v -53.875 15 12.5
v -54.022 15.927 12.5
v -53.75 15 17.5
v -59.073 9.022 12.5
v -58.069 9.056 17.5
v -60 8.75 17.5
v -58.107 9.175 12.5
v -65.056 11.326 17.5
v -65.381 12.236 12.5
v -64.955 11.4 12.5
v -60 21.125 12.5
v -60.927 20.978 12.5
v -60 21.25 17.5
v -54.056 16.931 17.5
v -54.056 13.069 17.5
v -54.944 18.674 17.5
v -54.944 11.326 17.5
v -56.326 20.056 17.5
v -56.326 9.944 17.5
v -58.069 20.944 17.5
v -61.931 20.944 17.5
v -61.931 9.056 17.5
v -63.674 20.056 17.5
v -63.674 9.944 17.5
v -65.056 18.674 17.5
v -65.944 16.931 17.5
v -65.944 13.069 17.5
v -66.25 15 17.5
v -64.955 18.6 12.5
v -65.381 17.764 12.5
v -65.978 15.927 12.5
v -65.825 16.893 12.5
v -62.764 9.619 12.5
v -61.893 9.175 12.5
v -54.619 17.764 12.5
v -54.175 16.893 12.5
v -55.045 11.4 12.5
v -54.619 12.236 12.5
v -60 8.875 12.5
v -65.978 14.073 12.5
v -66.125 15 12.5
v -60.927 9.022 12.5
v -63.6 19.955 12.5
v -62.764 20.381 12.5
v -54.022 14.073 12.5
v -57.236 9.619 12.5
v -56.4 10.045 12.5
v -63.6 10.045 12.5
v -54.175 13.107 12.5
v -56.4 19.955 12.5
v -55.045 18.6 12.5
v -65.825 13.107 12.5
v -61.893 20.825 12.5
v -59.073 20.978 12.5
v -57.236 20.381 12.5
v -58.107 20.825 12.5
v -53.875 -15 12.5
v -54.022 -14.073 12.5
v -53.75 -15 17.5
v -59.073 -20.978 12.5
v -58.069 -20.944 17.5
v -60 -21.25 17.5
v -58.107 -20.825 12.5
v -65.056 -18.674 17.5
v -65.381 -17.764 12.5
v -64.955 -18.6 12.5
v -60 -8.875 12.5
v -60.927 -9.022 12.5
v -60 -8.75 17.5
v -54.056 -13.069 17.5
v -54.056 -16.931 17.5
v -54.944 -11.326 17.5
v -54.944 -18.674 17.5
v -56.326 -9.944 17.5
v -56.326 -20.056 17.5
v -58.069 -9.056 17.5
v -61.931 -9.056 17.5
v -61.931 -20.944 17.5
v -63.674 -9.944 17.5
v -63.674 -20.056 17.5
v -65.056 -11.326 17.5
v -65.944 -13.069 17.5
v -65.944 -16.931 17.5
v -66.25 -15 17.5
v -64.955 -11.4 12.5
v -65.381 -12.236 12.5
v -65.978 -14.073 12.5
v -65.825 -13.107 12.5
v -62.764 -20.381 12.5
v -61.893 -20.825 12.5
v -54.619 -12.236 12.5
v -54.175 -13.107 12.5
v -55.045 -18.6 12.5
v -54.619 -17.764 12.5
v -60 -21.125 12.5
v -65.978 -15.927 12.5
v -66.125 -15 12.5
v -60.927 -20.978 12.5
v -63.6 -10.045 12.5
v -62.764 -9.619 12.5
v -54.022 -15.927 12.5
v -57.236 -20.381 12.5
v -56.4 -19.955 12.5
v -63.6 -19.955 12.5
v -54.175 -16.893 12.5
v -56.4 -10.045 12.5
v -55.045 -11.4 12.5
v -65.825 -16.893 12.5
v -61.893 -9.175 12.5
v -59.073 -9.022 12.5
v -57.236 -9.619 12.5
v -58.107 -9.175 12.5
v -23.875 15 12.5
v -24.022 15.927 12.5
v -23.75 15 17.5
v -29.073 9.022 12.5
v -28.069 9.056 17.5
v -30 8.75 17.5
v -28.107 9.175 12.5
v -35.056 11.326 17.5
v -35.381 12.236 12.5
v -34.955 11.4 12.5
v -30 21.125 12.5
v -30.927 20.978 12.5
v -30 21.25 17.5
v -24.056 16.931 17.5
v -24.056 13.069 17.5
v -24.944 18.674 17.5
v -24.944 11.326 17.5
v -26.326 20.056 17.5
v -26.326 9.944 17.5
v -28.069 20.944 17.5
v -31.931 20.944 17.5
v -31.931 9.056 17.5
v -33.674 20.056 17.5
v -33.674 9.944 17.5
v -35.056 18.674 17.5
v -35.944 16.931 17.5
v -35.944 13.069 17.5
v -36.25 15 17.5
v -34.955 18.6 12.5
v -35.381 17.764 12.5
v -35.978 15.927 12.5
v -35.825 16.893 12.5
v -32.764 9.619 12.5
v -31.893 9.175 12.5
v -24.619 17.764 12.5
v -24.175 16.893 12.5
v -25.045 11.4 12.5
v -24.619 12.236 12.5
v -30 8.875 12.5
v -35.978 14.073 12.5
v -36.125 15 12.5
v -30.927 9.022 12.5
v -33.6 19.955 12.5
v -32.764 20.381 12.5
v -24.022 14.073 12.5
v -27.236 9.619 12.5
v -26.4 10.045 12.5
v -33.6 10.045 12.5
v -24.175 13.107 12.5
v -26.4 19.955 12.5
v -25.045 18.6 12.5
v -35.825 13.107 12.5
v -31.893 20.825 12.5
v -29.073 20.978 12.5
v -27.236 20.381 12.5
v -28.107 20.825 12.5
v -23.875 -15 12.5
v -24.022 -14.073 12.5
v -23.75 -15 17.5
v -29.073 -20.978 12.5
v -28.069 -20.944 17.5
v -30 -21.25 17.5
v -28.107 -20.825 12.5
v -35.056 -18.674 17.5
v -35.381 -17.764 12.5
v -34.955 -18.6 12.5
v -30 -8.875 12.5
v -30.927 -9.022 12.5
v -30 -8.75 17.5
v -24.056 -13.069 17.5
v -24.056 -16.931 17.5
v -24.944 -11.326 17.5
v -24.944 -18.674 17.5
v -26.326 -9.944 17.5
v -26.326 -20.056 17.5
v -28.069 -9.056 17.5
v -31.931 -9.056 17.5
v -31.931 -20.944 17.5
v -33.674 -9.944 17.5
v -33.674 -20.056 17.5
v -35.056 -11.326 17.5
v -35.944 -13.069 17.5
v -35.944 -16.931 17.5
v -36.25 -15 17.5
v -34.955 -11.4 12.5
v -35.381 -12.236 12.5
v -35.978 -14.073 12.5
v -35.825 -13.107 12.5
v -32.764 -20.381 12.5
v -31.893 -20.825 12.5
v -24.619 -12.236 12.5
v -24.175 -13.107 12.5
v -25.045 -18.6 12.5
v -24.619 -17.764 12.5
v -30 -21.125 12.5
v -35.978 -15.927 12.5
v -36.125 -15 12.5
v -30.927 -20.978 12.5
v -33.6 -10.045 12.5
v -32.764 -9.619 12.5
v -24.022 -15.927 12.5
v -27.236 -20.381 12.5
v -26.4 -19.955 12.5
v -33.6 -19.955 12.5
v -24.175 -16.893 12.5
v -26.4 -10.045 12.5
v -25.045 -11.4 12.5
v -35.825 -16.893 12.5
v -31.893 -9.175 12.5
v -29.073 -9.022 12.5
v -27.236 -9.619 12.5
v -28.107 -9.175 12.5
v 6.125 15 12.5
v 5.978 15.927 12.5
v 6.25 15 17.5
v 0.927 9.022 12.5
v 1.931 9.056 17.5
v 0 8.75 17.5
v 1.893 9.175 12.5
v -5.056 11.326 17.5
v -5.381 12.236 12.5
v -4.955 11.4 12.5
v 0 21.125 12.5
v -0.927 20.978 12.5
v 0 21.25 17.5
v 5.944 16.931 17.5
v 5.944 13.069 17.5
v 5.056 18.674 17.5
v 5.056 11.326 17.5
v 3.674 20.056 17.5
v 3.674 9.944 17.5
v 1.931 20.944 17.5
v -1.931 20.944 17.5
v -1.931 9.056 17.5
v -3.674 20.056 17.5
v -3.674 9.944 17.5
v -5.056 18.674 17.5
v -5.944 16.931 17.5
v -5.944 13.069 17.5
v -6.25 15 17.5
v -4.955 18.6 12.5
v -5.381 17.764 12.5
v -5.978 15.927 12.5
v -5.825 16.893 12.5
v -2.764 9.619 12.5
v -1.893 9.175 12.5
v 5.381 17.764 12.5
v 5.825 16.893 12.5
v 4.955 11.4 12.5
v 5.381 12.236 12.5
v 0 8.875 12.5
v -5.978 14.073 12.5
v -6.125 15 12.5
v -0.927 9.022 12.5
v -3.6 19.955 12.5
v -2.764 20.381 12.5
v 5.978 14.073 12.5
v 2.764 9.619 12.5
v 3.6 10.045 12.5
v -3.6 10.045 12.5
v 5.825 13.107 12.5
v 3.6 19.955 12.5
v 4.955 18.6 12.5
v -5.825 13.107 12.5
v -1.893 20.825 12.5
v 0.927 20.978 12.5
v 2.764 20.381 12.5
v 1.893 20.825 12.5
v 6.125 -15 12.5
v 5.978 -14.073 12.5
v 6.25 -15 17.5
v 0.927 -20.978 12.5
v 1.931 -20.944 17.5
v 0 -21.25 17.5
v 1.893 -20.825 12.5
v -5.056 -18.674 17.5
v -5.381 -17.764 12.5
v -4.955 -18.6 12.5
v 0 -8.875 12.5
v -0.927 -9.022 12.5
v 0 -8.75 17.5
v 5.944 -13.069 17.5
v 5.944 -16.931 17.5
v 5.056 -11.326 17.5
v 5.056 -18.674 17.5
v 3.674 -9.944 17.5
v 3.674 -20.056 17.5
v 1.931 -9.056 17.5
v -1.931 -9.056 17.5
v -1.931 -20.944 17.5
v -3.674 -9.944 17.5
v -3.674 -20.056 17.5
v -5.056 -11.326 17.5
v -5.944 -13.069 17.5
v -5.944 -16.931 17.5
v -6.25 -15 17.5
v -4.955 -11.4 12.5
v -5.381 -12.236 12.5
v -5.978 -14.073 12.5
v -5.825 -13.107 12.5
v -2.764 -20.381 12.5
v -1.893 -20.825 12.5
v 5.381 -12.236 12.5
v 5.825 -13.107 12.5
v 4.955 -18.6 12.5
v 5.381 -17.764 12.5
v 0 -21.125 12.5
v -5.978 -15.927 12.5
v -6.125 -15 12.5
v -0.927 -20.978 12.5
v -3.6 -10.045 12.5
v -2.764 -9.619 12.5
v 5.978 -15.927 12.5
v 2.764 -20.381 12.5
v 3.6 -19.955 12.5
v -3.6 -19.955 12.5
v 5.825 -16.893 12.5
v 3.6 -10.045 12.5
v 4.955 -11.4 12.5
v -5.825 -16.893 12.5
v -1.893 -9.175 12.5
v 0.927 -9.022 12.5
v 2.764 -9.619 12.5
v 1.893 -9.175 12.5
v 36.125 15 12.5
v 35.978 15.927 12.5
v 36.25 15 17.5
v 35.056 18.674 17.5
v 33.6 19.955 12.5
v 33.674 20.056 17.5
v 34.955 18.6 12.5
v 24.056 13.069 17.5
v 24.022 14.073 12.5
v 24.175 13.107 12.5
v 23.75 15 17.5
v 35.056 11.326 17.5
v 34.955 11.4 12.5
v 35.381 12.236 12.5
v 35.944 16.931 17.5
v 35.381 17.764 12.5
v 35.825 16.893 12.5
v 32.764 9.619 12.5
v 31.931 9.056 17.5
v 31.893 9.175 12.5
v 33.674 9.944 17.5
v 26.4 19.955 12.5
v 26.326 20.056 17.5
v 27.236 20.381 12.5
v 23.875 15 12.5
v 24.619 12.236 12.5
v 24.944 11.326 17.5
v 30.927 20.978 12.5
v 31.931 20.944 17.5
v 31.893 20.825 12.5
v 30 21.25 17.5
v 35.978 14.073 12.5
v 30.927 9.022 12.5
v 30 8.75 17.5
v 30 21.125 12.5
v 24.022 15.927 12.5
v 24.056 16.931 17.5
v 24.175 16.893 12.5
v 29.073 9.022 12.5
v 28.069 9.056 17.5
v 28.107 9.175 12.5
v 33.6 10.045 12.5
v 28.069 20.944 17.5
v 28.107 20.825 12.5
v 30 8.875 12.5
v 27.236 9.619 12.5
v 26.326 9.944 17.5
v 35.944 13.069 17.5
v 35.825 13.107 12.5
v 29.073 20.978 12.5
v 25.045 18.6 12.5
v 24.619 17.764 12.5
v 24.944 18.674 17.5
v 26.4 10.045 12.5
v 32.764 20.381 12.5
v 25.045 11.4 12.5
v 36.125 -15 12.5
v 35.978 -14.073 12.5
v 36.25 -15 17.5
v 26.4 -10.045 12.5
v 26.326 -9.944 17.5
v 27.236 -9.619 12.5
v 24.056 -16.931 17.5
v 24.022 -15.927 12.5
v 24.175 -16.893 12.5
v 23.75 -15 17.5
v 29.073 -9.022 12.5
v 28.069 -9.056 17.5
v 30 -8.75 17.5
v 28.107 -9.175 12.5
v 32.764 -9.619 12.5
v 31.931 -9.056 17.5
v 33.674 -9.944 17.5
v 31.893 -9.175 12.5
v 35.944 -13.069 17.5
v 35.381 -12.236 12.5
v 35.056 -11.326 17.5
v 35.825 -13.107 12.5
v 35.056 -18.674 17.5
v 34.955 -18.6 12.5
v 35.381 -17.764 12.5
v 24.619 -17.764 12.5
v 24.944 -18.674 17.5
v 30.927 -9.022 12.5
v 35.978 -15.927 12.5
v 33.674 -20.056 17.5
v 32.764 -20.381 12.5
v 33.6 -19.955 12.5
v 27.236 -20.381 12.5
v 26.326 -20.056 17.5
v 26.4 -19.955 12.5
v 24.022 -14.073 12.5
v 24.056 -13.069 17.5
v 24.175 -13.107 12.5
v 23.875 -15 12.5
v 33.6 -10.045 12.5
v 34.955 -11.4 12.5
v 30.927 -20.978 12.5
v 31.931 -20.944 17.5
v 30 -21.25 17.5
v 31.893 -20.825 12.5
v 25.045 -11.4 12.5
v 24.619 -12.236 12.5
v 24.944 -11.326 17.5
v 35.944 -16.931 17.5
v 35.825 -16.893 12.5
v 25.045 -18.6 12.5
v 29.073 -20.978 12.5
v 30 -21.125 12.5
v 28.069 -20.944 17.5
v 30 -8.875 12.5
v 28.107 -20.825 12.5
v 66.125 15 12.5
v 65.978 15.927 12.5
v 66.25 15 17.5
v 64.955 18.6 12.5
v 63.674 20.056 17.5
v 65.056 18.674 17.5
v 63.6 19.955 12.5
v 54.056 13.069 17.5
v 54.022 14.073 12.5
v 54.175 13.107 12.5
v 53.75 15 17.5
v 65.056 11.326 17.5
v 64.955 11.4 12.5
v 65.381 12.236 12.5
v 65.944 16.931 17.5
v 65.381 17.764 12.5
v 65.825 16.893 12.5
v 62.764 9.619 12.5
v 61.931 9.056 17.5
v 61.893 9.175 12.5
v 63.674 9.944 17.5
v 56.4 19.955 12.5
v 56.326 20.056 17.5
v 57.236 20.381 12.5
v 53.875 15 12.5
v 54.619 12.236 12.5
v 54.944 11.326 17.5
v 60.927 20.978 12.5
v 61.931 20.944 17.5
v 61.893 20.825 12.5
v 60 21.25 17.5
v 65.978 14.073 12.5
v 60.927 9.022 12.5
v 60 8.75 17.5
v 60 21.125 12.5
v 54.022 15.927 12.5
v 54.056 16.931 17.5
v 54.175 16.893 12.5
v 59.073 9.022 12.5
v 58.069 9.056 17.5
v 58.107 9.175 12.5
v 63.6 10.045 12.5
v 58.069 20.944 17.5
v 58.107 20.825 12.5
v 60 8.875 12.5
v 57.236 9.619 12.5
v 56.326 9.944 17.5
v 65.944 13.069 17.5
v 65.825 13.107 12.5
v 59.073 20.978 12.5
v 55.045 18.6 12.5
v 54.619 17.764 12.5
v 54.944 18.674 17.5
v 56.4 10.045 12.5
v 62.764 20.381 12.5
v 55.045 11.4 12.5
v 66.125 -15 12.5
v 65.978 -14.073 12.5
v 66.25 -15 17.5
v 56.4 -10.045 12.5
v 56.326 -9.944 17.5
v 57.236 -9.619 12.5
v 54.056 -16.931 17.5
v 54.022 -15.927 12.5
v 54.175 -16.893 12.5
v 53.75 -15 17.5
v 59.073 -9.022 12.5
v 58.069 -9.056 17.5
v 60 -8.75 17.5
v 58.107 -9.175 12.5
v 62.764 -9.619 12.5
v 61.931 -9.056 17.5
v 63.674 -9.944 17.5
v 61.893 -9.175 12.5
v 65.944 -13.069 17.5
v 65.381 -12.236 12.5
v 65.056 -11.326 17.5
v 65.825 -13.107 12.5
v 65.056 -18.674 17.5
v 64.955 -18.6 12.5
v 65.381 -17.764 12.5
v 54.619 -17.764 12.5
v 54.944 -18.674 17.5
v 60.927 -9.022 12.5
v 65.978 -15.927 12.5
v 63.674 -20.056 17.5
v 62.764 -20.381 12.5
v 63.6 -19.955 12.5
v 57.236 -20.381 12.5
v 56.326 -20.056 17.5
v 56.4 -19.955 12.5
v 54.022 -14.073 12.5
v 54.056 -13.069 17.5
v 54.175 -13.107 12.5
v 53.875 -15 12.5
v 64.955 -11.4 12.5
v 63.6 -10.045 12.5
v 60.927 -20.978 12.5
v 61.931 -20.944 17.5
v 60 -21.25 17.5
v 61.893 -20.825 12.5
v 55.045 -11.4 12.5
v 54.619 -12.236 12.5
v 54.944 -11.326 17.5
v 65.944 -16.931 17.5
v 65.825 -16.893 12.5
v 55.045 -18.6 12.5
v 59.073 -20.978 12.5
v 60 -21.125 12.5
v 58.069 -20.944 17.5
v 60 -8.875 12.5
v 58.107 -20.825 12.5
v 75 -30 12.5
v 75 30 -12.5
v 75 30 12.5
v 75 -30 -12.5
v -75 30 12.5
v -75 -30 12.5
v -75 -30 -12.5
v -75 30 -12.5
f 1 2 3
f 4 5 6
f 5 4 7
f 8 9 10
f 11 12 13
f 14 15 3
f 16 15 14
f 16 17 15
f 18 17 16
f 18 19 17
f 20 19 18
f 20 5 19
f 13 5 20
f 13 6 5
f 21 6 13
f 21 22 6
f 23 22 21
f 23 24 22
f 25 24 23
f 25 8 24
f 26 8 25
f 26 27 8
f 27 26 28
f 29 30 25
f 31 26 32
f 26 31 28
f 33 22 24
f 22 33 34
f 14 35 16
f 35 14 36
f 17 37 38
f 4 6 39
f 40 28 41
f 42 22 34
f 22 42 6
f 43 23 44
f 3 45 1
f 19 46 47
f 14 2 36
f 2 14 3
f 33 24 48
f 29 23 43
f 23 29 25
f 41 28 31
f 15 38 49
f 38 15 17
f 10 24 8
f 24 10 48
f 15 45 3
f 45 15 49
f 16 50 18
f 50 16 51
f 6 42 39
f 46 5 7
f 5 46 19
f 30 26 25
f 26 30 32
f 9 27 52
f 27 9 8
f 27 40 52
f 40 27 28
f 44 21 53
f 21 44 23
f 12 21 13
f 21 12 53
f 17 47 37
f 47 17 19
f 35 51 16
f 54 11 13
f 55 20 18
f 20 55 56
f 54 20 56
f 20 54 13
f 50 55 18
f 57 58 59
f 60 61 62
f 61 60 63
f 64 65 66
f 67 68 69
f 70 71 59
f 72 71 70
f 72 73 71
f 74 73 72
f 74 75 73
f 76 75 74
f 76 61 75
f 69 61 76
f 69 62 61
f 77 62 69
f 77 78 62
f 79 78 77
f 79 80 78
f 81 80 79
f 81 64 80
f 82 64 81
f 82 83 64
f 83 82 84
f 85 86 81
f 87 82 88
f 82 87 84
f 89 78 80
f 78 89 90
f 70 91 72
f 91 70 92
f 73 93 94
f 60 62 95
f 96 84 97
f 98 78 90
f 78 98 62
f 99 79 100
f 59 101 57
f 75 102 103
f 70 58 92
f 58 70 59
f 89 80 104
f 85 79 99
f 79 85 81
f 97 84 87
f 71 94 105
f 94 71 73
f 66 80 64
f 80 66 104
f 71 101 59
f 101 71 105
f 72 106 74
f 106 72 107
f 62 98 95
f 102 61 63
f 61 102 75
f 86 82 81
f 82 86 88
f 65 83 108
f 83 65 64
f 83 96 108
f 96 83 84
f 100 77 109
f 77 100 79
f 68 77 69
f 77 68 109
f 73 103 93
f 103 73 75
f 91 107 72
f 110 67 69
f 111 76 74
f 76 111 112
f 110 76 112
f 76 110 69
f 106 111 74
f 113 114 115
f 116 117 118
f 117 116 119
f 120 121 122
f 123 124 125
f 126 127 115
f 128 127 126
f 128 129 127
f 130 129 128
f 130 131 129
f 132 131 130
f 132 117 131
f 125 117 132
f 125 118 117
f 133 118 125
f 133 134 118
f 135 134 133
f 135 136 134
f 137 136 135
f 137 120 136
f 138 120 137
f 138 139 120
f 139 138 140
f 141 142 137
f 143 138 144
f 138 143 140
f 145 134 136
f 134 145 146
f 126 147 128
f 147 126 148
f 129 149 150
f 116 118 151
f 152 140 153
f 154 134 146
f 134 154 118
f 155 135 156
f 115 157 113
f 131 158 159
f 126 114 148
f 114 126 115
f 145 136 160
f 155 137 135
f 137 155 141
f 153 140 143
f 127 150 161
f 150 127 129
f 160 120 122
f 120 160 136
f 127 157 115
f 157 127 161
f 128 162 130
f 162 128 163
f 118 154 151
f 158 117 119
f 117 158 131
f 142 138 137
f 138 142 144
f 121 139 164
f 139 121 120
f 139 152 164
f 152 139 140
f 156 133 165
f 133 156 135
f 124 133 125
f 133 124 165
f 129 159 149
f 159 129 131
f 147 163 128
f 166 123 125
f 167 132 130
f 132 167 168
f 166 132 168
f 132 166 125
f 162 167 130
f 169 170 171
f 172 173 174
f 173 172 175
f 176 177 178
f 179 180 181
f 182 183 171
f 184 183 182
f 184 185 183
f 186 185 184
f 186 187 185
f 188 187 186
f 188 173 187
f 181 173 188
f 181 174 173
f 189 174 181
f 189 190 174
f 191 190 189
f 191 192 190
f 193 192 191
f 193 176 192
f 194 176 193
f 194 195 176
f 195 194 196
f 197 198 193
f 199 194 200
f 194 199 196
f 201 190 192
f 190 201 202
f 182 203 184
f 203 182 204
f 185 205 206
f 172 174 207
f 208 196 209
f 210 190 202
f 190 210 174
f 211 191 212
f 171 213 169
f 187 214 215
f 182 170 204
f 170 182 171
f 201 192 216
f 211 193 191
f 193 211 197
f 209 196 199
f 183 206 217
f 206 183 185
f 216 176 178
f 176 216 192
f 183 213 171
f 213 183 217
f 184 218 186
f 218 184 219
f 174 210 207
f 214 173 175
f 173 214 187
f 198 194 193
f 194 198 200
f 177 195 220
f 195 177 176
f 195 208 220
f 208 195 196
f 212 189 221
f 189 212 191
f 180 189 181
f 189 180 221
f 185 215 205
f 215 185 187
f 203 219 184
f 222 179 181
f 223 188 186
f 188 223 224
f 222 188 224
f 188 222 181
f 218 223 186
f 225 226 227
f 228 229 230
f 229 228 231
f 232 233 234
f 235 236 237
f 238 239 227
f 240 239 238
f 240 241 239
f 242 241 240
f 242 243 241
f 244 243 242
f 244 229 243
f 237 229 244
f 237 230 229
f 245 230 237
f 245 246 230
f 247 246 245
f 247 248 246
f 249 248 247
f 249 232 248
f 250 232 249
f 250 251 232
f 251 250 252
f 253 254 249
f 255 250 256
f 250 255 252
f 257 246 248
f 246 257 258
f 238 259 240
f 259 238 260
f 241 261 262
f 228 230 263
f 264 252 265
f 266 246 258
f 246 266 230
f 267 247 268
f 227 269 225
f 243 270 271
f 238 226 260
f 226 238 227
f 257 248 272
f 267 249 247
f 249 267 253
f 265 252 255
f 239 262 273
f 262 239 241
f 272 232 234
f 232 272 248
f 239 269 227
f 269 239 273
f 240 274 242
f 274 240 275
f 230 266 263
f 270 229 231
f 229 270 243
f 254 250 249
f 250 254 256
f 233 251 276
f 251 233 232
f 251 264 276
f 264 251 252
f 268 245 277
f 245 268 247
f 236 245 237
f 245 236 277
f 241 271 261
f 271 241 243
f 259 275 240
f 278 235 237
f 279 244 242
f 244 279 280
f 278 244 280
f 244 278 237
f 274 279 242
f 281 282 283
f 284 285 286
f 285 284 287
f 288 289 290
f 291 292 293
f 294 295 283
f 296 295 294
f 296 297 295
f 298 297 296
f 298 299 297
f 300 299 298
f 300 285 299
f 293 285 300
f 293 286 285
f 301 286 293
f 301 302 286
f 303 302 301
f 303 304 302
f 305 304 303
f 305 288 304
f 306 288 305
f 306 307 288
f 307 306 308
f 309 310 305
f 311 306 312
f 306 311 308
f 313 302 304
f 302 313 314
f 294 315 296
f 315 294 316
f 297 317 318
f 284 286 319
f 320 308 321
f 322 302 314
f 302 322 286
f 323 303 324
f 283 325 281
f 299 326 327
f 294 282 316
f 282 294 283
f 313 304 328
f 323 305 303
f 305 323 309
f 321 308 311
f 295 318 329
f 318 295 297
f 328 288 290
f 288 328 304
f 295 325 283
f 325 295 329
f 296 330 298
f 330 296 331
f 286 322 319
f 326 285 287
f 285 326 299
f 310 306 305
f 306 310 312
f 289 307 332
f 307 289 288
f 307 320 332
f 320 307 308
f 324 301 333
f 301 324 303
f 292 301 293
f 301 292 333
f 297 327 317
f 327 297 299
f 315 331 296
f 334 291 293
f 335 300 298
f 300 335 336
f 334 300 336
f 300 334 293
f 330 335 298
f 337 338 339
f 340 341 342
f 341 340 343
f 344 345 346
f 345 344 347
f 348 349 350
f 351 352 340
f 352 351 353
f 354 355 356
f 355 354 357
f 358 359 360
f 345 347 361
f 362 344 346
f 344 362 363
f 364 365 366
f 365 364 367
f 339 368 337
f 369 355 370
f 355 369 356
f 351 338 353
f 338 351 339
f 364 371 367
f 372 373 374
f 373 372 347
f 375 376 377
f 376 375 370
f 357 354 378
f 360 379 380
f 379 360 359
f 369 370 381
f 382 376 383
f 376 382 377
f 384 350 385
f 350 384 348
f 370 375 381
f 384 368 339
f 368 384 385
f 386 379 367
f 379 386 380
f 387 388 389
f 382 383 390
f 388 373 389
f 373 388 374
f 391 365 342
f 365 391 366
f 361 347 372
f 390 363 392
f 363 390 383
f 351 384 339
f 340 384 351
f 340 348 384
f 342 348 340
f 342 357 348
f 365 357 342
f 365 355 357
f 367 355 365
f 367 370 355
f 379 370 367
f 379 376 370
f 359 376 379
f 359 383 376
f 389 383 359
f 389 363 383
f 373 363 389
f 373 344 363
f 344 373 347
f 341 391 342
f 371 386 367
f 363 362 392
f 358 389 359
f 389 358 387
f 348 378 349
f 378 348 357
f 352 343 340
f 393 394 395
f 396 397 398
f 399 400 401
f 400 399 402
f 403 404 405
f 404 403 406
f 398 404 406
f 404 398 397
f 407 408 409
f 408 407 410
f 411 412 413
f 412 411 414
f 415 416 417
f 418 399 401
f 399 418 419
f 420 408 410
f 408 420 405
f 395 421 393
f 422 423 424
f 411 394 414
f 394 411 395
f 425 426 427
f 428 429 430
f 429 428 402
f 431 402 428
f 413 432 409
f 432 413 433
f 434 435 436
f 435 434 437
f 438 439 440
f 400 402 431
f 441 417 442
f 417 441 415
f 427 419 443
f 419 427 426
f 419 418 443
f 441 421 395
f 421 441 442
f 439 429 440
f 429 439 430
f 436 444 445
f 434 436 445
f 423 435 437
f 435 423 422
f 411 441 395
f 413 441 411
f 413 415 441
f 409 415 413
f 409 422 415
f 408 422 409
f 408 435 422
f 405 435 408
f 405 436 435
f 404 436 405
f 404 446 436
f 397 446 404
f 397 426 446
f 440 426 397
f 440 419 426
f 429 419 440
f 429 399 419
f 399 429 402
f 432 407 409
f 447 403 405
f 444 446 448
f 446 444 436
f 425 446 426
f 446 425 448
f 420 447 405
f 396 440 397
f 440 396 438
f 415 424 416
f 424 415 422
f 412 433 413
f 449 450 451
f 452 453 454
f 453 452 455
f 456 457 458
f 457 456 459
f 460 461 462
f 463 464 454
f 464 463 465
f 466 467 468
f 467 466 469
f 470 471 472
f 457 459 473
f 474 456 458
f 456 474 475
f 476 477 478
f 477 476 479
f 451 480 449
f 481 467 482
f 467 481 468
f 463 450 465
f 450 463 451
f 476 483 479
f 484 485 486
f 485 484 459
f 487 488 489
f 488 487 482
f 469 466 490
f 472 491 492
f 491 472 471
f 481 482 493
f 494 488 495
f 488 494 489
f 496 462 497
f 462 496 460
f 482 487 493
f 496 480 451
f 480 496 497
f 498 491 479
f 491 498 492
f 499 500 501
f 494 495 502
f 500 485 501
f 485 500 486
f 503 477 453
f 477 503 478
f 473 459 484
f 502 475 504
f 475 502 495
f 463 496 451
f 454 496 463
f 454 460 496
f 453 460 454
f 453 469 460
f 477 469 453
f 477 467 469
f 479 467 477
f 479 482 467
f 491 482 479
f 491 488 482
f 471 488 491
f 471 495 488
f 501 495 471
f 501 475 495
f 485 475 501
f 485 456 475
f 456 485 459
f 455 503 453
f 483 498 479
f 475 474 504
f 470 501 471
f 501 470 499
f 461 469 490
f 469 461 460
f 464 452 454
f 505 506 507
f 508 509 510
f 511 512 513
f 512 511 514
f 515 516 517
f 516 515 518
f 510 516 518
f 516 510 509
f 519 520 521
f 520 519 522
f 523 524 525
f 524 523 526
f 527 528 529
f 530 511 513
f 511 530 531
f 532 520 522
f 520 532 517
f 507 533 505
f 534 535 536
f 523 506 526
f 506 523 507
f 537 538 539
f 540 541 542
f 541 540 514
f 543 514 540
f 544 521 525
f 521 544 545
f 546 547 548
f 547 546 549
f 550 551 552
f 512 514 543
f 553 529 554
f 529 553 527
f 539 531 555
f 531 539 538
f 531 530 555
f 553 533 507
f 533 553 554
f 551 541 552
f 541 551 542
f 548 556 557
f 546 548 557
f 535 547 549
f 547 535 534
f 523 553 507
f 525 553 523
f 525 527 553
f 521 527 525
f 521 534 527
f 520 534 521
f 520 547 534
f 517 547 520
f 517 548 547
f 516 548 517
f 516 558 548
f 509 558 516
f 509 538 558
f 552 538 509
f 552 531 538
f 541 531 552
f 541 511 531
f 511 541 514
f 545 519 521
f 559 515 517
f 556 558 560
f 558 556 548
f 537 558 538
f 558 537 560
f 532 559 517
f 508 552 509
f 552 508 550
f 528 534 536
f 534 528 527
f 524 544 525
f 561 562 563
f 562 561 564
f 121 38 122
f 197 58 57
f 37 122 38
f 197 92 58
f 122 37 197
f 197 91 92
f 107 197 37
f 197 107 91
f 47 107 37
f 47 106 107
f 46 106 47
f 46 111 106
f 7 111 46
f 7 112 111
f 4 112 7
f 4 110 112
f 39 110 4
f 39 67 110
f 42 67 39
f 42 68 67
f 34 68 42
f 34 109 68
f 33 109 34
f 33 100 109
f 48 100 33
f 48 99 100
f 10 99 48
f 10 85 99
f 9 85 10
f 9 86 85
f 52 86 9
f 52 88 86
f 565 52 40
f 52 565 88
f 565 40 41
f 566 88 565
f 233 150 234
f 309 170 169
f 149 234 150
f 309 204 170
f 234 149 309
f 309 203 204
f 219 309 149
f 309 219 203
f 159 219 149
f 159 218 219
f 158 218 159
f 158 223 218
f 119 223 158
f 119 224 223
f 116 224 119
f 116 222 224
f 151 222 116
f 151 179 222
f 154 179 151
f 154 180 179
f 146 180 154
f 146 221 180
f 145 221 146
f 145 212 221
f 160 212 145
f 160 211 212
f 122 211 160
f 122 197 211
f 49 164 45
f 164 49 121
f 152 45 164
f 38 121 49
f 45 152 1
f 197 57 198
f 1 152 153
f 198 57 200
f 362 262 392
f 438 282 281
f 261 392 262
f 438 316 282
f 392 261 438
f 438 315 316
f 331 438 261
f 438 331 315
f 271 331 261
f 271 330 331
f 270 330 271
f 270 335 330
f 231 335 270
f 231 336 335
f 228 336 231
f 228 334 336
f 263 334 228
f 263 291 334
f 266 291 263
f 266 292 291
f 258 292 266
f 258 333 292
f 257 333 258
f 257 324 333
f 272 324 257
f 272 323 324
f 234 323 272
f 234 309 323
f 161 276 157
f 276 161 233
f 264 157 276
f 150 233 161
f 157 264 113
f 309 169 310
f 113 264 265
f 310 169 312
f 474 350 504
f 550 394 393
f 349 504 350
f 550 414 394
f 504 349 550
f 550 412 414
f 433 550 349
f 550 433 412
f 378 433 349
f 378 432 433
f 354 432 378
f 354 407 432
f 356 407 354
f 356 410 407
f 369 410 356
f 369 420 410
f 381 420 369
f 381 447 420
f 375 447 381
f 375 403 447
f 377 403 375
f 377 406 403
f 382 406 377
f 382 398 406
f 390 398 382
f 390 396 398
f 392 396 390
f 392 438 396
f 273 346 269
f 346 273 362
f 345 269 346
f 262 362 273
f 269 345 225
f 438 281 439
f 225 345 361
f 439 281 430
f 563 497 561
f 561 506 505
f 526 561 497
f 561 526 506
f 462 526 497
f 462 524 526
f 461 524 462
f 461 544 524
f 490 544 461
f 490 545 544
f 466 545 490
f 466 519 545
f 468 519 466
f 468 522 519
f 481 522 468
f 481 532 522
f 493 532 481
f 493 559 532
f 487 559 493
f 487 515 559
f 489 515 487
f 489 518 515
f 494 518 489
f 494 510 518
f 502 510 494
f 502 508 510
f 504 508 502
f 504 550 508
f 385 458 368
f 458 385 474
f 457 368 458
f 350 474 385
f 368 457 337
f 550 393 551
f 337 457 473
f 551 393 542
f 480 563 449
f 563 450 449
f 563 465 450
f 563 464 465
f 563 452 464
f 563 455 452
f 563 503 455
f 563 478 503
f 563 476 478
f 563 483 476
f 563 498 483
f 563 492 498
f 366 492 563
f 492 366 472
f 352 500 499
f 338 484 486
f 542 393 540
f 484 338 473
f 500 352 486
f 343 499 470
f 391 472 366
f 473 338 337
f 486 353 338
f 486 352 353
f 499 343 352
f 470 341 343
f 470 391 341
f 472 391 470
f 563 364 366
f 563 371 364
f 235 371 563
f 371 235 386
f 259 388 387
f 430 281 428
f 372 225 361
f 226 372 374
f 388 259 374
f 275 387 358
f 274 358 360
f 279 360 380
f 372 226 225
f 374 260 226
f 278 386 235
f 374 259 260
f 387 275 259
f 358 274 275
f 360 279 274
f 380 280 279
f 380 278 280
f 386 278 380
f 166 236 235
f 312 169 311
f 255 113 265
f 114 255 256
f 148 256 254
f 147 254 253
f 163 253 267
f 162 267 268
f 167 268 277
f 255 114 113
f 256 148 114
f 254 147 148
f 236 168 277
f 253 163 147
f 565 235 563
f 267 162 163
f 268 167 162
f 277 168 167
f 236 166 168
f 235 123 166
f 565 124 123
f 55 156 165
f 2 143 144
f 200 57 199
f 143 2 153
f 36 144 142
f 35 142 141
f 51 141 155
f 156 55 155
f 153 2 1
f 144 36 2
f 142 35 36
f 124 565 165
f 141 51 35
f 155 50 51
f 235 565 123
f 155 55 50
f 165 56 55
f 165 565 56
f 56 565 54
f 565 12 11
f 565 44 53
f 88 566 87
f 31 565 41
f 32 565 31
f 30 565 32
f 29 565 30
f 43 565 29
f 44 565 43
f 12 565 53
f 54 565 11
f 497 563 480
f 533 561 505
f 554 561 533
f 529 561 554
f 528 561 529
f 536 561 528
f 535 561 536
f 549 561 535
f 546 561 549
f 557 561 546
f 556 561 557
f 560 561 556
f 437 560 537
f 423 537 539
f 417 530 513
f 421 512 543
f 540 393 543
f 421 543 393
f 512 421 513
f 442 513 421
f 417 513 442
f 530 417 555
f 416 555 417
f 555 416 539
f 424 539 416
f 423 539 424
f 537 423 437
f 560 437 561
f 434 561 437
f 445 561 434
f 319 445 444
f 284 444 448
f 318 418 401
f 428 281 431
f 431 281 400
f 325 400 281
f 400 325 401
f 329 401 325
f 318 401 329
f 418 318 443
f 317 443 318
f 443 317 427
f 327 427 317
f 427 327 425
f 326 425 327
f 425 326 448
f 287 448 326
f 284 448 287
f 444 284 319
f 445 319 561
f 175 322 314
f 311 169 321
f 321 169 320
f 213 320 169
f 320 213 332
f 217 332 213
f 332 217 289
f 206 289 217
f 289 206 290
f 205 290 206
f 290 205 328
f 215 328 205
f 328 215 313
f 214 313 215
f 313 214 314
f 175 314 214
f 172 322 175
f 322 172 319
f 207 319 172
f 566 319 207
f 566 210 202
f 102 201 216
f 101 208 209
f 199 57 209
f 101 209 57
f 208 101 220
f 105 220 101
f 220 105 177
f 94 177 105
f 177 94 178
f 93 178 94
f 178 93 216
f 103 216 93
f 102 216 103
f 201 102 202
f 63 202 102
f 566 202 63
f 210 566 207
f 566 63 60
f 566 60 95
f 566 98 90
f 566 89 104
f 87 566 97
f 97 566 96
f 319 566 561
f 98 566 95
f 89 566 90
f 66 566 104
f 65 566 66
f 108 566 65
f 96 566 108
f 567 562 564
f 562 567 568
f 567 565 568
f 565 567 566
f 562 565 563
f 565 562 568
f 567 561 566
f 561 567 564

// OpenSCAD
// Length of Lego
a = 150;

// Number of pegs across
b = 5;

cube([a,a/2.5,a/6], center = true);

for ( i =[0:b-1])
{
    translate([(-(a/2)+(a/10)+((a/b)*i)), a/10, a/12]) cylinder(a/15, a/25, a/24
    , center = true);
    translate([(-(a/2)+(a/10)+((a/b)*i)), -a/10, a/12])cylinder (a/15, a/25, a/24, center = true);
}


    
